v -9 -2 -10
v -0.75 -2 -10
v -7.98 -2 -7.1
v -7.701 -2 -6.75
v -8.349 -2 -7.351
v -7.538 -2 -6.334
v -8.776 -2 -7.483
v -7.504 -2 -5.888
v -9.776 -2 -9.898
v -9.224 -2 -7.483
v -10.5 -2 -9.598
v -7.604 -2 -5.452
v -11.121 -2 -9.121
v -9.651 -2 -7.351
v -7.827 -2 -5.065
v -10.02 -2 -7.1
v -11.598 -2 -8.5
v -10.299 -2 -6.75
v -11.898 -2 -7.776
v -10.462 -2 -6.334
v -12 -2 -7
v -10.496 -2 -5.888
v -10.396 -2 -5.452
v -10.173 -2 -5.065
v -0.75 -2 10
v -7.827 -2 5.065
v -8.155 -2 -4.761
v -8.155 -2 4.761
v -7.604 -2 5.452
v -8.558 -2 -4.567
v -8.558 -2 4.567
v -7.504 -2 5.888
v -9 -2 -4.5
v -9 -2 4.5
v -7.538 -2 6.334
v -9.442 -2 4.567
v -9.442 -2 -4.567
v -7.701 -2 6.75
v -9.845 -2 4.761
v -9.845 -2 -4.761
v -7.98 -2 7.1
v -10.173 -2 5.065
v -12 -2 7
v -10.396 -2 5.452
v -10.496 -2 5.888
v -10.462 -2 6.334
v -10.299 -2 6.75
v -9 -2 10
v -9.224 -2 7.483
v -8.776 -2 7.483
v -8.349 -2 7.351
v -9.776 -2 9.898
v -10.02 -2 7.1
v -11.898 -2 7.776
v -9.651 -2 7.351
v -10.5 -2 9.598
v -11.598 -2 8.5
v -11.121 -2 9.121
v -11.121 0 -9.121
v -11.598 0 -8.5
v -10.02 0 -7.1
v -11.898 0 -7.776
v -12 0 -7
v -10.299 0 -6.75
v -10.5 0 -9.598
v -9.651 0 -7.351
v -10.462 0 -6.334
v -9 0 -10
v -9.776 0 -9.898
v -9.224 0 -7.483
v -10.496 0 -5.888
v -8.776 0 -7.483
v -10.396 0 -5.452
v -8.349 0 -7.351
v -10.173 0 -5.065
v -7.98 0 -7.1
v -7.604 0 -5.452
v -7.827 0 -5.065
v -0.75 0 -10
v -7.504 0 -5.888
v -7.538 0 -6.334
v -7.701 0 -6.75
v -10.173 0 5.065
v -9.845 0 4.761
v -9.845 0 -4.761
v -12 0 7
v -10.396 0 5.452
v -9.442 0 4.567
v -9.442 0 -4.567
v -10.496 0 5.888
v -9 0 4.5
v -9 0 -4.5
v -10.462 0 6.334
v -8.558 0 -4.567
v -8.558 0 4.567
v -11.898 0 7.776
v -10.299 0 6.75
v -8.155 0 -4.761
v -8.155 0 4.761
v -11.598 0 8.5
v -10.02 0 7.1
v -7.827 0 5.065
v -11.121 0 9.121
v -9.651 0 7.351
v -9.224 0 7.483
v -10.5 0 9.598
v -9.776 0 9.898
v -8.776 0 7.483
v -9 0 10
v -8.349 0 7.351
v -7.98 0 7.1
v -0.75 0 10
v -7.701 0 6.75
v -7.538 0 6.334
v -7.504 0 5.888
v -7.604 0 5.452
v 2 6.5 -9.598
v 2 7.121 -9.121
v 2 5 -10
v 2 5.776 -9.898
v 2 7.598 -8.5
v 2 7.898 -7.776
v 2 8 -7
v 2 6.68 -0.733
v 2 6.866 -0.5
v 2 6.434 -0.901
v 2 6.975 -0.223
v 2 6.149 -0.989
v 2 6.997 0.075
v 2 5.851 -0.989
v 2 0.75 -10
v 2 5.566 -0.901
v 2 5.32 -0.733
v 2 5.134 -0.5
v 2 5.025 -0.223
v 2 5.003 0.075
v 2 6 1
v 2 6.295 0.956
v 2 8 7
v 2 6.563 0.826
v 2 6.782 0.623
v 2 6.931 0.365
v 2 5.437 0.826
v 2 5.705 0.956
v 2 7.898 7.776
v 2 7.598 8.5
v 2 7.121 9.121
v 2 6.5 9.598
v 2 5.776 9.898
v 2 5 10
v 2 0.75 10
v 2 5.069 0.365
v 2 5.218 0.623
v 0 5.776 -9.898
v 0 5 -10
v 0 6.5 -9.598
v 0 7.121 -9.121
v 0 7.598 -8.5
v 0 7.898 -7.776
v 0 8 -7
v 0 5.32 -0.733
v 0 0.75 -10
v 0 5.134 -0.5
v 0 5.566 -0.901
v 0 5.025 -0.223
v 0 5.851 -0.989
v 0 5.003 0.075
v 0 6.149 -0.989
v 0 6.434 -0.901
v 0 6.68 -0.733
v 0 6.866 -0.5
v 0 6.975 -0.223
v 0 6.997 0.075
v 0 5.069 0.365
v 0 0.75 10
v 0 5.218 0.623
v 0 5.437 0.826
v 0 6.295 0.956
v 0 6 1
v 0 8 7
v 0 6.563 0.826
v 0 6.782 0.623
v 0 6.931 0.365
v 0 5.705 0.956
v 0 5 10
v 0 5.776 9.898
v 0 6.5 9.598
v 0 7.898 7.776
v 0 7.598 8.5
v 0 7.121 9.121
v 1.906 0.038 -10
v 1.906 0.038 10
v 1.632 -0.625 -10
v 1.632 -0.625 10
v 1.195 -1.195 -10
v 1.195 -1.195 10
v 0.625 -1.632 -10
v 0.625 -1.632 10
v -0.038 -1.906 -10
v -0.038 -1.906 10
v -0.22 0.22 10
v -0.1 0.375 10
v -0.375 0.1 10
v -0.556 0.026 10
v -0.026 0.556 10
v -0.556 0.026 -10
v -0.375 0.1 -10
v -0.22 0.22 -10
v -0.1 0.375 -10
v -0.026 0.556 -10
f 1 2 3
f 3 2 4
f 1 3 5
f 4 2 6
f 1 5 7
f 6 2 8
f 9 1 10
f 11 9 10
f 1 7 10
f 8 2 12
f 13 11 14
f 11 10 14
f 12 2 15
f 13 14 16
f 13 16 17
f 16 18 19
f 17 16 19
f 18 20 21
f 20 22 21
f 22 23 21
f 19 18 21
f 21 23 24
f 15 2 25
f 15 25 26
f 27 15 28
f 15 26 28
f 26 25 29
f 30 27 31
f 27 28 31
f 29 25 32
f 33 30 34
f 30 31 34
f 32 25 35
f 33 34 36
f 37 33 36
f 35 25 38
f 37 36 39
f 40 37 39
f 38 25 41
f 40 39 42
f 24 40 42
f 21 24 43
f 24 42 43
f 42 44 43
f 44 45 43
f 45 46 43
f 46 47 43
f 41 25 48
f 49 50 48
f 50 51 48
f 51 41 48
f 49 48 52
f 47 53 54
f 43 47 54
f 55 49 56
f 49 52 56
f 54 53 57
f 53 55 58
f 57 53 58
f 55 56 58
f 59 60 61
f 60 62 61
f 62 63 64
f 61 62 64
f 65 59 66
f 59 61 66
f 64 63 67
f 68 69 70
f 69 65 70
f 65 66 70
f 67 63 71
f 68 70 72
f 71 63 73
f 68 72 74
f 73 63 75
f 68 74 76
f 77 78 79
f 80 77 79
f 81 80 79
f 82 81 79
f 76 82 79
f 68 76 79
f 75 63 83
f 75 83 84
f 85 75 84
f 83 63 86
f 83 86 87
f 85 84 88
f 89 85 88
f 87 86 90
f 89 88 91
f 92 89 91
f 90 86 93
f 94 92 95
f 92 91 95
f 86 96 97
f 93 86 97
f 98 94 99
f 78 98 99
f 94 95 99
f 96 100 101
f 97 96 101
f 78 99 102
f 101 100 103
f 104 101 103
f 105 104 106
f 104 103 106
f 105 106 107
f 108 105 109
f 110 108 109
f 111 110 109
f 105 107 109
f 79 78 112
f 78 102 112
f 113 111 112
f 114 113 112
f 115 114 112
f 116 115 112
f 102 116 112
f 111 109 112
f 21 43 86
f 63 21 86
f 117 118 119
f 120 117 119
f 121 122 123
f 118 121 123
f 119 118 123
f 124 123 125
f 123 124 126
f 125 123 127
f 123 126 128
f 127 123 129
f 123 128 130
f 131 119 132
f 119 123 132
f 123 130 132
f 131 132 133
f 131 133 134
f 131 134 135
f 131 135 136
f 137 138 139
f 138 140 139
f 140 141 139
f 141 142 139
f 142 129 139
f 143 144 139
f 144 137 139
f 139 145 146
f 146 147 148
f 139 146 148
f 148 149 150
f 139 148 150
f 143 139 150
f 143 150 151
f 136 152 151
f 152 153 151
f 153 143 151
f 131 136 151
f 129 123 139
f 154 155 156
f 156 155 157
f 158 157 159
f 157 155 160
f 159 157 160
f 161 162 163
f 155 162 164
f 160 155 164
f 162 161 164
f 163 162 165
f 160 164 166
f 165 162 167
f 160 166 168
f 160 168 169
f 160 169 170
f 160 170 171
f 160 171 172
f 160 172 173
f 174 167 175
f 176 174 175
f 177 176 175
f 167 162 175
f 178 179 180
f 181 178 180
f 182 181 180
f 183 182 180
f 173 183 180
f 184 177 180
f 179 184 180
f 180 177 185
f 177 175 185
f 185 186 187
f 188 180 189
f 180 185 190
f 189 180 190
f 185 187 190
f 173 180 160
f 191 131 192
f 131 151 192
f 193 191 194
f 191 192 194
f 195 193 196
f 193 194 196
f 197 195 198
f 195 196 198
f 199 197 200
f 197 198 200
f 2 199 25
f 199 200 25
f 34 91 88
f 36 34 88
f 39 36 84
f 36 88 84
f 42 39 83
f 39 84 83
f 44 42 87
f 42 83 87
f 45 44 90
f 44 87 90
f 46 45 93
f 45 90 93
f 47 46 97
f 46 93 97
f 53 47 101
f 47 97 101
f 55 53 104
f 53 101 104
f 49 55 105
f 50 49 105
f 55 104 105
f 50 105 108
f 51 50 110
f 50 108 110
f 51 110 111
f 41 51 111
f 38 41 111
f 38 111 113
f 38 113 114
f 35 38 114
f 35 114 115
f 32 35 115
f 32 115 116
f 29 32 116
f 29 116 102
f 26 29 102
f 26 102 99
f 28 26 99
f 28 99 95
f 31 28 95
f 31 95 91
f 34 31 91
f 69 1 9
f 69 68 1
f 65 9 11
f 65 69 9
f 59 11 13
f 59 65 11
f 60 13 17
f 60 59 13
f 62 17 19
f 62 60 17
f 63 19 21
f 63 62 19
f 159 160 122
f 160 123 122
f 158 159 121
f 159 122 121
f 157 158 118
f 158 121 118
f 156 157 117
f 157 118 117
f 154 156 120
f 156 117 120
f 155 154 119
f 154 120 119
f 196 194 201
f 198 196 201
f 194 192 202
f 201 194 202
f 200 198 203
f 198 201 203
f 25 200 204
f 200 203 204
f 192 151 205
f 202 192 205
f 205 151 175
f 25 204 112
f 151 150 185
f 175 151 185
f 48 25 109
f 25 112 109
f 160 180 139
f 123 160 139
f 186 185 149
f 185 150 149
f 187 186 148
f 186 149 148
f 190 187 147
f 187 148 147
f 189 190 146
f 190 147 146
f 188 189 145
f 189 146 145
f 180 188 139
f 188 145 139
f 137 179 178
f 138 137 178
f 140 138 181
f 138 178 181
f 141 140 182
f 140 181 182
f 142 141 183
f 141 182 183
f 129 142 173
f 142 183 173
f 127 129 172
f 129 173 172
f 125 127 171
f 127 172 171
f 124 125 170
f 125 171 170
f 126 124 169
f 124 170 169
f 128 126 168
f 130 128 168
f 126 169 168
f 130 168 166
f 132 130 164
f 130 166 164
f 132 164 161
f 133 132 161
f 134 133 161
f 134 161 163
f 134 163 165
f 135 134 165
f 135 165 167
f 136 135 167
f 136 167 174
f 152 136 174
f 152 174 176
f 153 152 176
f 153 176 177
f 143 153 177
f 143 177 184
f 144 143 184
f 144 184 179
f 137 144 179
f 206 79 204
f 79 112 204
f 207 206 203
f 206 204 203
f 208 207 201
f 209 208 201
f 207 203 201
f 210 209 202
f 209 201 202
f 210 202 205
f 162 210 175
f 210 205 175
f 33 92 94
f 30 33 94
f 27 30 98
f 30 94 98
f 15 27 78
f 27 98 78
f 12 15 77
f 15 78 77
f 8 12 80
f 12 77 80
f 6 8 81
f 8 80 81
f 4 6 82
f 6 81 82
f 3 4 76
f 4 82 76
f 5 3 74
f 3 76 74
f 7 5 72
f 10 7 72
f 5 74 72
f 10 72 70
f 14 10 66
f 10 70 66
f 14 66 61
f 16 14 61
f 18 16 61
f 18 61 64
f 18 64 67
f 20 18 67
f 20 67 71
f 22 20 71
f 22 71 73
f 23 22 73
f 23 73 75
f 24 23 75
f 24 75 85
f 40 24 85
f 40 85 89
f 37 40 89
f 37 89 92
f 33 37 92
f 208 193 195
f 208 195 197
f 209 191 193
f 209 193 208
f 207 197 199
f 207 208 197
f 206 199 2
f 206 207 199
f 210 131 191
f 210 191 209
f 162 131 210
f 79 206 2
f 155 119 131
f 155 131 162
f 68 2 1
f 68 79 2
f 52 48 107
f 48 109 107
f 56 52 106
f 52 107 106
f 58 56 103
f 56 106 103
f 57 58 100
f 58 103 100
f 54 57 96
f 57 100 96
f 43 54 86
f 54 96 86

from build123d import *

# Parameters (mm, degrees)
BASE_FLANGE1_DEPTH = 10
FILLET1_R          = 3
SKETCH8_R          = 1.5
CUT_EXTRUDE1_DEPTH = 18.549928775
SKETCH9_R          = 1
CUT_EXTRUDE2_DEPTH = 18.549928775


# Sheet-metal steps are written as plain solids
with BuildPart() as part:
    # Sketch2 → Base-Flange1 (new, symmetric)
    with BuildSketch(Plane.XY):
        with BuildLine():
            Line((-12, 0), (-0.75, 0))
            ThreePointArc((-0.75, 0), (-0.219669914, 0.219669914), (0, 0.75))
            Line((0, 0.75), (0, 8))
            Line((0, 8), (2, 8))
            Line((2, 8), (2, 0.75))
            ThreePointArc((2, 0.75), (1.194543648, -1.194543648), (-0.75, -2))
            Line((-0.75, -2), (-12, -2))
            Line((-12, -2), (-12, 0))
        make_face()
    extrude(amount=BASE_FLANGE1_DEPTH, both=True)

    # Fillet1
    fillet1_edges = [part.edges().sort_by_distance(p)[0] for p in [
        (-12, -1, 10),
        (1, 8, 10),
        (-12, -1, -10),
        (1, 8, -10),
    ]]
    fillet(fillet1_edges, radius=FILLET1_R)

    # Sketch8 → Cut-Extrude1 (cut, through all)
    with BuildSketch(Plane(origin=(0, 0, 0), x_dir=(1, 0, 0), z_dir=(0, 1, 0))):
        with Locations(Location((-9, 6, 0), (0, 0, 270))):
            Circle(SKETCH8_R)
        with Locations(Location((-9, -6, 0), (0, 0, 90))):
            Circle(SKETCH8_R)
    extrude(amount=-CUT_EXTRUDE1_DEPTH, mode=Mode.SUBTRACT)

    # Sketch9 → Cut-Extrude2 (cut, through all)
    with BuildSketch(Plane.ZY):
        with Locations((0, 6)):
            Circle(SKETCH9_R)
    extrude(amount=-CUT_EXTRUDE2_DEPTH, mode=Mode.SUBTRACT)


solid = part.part
